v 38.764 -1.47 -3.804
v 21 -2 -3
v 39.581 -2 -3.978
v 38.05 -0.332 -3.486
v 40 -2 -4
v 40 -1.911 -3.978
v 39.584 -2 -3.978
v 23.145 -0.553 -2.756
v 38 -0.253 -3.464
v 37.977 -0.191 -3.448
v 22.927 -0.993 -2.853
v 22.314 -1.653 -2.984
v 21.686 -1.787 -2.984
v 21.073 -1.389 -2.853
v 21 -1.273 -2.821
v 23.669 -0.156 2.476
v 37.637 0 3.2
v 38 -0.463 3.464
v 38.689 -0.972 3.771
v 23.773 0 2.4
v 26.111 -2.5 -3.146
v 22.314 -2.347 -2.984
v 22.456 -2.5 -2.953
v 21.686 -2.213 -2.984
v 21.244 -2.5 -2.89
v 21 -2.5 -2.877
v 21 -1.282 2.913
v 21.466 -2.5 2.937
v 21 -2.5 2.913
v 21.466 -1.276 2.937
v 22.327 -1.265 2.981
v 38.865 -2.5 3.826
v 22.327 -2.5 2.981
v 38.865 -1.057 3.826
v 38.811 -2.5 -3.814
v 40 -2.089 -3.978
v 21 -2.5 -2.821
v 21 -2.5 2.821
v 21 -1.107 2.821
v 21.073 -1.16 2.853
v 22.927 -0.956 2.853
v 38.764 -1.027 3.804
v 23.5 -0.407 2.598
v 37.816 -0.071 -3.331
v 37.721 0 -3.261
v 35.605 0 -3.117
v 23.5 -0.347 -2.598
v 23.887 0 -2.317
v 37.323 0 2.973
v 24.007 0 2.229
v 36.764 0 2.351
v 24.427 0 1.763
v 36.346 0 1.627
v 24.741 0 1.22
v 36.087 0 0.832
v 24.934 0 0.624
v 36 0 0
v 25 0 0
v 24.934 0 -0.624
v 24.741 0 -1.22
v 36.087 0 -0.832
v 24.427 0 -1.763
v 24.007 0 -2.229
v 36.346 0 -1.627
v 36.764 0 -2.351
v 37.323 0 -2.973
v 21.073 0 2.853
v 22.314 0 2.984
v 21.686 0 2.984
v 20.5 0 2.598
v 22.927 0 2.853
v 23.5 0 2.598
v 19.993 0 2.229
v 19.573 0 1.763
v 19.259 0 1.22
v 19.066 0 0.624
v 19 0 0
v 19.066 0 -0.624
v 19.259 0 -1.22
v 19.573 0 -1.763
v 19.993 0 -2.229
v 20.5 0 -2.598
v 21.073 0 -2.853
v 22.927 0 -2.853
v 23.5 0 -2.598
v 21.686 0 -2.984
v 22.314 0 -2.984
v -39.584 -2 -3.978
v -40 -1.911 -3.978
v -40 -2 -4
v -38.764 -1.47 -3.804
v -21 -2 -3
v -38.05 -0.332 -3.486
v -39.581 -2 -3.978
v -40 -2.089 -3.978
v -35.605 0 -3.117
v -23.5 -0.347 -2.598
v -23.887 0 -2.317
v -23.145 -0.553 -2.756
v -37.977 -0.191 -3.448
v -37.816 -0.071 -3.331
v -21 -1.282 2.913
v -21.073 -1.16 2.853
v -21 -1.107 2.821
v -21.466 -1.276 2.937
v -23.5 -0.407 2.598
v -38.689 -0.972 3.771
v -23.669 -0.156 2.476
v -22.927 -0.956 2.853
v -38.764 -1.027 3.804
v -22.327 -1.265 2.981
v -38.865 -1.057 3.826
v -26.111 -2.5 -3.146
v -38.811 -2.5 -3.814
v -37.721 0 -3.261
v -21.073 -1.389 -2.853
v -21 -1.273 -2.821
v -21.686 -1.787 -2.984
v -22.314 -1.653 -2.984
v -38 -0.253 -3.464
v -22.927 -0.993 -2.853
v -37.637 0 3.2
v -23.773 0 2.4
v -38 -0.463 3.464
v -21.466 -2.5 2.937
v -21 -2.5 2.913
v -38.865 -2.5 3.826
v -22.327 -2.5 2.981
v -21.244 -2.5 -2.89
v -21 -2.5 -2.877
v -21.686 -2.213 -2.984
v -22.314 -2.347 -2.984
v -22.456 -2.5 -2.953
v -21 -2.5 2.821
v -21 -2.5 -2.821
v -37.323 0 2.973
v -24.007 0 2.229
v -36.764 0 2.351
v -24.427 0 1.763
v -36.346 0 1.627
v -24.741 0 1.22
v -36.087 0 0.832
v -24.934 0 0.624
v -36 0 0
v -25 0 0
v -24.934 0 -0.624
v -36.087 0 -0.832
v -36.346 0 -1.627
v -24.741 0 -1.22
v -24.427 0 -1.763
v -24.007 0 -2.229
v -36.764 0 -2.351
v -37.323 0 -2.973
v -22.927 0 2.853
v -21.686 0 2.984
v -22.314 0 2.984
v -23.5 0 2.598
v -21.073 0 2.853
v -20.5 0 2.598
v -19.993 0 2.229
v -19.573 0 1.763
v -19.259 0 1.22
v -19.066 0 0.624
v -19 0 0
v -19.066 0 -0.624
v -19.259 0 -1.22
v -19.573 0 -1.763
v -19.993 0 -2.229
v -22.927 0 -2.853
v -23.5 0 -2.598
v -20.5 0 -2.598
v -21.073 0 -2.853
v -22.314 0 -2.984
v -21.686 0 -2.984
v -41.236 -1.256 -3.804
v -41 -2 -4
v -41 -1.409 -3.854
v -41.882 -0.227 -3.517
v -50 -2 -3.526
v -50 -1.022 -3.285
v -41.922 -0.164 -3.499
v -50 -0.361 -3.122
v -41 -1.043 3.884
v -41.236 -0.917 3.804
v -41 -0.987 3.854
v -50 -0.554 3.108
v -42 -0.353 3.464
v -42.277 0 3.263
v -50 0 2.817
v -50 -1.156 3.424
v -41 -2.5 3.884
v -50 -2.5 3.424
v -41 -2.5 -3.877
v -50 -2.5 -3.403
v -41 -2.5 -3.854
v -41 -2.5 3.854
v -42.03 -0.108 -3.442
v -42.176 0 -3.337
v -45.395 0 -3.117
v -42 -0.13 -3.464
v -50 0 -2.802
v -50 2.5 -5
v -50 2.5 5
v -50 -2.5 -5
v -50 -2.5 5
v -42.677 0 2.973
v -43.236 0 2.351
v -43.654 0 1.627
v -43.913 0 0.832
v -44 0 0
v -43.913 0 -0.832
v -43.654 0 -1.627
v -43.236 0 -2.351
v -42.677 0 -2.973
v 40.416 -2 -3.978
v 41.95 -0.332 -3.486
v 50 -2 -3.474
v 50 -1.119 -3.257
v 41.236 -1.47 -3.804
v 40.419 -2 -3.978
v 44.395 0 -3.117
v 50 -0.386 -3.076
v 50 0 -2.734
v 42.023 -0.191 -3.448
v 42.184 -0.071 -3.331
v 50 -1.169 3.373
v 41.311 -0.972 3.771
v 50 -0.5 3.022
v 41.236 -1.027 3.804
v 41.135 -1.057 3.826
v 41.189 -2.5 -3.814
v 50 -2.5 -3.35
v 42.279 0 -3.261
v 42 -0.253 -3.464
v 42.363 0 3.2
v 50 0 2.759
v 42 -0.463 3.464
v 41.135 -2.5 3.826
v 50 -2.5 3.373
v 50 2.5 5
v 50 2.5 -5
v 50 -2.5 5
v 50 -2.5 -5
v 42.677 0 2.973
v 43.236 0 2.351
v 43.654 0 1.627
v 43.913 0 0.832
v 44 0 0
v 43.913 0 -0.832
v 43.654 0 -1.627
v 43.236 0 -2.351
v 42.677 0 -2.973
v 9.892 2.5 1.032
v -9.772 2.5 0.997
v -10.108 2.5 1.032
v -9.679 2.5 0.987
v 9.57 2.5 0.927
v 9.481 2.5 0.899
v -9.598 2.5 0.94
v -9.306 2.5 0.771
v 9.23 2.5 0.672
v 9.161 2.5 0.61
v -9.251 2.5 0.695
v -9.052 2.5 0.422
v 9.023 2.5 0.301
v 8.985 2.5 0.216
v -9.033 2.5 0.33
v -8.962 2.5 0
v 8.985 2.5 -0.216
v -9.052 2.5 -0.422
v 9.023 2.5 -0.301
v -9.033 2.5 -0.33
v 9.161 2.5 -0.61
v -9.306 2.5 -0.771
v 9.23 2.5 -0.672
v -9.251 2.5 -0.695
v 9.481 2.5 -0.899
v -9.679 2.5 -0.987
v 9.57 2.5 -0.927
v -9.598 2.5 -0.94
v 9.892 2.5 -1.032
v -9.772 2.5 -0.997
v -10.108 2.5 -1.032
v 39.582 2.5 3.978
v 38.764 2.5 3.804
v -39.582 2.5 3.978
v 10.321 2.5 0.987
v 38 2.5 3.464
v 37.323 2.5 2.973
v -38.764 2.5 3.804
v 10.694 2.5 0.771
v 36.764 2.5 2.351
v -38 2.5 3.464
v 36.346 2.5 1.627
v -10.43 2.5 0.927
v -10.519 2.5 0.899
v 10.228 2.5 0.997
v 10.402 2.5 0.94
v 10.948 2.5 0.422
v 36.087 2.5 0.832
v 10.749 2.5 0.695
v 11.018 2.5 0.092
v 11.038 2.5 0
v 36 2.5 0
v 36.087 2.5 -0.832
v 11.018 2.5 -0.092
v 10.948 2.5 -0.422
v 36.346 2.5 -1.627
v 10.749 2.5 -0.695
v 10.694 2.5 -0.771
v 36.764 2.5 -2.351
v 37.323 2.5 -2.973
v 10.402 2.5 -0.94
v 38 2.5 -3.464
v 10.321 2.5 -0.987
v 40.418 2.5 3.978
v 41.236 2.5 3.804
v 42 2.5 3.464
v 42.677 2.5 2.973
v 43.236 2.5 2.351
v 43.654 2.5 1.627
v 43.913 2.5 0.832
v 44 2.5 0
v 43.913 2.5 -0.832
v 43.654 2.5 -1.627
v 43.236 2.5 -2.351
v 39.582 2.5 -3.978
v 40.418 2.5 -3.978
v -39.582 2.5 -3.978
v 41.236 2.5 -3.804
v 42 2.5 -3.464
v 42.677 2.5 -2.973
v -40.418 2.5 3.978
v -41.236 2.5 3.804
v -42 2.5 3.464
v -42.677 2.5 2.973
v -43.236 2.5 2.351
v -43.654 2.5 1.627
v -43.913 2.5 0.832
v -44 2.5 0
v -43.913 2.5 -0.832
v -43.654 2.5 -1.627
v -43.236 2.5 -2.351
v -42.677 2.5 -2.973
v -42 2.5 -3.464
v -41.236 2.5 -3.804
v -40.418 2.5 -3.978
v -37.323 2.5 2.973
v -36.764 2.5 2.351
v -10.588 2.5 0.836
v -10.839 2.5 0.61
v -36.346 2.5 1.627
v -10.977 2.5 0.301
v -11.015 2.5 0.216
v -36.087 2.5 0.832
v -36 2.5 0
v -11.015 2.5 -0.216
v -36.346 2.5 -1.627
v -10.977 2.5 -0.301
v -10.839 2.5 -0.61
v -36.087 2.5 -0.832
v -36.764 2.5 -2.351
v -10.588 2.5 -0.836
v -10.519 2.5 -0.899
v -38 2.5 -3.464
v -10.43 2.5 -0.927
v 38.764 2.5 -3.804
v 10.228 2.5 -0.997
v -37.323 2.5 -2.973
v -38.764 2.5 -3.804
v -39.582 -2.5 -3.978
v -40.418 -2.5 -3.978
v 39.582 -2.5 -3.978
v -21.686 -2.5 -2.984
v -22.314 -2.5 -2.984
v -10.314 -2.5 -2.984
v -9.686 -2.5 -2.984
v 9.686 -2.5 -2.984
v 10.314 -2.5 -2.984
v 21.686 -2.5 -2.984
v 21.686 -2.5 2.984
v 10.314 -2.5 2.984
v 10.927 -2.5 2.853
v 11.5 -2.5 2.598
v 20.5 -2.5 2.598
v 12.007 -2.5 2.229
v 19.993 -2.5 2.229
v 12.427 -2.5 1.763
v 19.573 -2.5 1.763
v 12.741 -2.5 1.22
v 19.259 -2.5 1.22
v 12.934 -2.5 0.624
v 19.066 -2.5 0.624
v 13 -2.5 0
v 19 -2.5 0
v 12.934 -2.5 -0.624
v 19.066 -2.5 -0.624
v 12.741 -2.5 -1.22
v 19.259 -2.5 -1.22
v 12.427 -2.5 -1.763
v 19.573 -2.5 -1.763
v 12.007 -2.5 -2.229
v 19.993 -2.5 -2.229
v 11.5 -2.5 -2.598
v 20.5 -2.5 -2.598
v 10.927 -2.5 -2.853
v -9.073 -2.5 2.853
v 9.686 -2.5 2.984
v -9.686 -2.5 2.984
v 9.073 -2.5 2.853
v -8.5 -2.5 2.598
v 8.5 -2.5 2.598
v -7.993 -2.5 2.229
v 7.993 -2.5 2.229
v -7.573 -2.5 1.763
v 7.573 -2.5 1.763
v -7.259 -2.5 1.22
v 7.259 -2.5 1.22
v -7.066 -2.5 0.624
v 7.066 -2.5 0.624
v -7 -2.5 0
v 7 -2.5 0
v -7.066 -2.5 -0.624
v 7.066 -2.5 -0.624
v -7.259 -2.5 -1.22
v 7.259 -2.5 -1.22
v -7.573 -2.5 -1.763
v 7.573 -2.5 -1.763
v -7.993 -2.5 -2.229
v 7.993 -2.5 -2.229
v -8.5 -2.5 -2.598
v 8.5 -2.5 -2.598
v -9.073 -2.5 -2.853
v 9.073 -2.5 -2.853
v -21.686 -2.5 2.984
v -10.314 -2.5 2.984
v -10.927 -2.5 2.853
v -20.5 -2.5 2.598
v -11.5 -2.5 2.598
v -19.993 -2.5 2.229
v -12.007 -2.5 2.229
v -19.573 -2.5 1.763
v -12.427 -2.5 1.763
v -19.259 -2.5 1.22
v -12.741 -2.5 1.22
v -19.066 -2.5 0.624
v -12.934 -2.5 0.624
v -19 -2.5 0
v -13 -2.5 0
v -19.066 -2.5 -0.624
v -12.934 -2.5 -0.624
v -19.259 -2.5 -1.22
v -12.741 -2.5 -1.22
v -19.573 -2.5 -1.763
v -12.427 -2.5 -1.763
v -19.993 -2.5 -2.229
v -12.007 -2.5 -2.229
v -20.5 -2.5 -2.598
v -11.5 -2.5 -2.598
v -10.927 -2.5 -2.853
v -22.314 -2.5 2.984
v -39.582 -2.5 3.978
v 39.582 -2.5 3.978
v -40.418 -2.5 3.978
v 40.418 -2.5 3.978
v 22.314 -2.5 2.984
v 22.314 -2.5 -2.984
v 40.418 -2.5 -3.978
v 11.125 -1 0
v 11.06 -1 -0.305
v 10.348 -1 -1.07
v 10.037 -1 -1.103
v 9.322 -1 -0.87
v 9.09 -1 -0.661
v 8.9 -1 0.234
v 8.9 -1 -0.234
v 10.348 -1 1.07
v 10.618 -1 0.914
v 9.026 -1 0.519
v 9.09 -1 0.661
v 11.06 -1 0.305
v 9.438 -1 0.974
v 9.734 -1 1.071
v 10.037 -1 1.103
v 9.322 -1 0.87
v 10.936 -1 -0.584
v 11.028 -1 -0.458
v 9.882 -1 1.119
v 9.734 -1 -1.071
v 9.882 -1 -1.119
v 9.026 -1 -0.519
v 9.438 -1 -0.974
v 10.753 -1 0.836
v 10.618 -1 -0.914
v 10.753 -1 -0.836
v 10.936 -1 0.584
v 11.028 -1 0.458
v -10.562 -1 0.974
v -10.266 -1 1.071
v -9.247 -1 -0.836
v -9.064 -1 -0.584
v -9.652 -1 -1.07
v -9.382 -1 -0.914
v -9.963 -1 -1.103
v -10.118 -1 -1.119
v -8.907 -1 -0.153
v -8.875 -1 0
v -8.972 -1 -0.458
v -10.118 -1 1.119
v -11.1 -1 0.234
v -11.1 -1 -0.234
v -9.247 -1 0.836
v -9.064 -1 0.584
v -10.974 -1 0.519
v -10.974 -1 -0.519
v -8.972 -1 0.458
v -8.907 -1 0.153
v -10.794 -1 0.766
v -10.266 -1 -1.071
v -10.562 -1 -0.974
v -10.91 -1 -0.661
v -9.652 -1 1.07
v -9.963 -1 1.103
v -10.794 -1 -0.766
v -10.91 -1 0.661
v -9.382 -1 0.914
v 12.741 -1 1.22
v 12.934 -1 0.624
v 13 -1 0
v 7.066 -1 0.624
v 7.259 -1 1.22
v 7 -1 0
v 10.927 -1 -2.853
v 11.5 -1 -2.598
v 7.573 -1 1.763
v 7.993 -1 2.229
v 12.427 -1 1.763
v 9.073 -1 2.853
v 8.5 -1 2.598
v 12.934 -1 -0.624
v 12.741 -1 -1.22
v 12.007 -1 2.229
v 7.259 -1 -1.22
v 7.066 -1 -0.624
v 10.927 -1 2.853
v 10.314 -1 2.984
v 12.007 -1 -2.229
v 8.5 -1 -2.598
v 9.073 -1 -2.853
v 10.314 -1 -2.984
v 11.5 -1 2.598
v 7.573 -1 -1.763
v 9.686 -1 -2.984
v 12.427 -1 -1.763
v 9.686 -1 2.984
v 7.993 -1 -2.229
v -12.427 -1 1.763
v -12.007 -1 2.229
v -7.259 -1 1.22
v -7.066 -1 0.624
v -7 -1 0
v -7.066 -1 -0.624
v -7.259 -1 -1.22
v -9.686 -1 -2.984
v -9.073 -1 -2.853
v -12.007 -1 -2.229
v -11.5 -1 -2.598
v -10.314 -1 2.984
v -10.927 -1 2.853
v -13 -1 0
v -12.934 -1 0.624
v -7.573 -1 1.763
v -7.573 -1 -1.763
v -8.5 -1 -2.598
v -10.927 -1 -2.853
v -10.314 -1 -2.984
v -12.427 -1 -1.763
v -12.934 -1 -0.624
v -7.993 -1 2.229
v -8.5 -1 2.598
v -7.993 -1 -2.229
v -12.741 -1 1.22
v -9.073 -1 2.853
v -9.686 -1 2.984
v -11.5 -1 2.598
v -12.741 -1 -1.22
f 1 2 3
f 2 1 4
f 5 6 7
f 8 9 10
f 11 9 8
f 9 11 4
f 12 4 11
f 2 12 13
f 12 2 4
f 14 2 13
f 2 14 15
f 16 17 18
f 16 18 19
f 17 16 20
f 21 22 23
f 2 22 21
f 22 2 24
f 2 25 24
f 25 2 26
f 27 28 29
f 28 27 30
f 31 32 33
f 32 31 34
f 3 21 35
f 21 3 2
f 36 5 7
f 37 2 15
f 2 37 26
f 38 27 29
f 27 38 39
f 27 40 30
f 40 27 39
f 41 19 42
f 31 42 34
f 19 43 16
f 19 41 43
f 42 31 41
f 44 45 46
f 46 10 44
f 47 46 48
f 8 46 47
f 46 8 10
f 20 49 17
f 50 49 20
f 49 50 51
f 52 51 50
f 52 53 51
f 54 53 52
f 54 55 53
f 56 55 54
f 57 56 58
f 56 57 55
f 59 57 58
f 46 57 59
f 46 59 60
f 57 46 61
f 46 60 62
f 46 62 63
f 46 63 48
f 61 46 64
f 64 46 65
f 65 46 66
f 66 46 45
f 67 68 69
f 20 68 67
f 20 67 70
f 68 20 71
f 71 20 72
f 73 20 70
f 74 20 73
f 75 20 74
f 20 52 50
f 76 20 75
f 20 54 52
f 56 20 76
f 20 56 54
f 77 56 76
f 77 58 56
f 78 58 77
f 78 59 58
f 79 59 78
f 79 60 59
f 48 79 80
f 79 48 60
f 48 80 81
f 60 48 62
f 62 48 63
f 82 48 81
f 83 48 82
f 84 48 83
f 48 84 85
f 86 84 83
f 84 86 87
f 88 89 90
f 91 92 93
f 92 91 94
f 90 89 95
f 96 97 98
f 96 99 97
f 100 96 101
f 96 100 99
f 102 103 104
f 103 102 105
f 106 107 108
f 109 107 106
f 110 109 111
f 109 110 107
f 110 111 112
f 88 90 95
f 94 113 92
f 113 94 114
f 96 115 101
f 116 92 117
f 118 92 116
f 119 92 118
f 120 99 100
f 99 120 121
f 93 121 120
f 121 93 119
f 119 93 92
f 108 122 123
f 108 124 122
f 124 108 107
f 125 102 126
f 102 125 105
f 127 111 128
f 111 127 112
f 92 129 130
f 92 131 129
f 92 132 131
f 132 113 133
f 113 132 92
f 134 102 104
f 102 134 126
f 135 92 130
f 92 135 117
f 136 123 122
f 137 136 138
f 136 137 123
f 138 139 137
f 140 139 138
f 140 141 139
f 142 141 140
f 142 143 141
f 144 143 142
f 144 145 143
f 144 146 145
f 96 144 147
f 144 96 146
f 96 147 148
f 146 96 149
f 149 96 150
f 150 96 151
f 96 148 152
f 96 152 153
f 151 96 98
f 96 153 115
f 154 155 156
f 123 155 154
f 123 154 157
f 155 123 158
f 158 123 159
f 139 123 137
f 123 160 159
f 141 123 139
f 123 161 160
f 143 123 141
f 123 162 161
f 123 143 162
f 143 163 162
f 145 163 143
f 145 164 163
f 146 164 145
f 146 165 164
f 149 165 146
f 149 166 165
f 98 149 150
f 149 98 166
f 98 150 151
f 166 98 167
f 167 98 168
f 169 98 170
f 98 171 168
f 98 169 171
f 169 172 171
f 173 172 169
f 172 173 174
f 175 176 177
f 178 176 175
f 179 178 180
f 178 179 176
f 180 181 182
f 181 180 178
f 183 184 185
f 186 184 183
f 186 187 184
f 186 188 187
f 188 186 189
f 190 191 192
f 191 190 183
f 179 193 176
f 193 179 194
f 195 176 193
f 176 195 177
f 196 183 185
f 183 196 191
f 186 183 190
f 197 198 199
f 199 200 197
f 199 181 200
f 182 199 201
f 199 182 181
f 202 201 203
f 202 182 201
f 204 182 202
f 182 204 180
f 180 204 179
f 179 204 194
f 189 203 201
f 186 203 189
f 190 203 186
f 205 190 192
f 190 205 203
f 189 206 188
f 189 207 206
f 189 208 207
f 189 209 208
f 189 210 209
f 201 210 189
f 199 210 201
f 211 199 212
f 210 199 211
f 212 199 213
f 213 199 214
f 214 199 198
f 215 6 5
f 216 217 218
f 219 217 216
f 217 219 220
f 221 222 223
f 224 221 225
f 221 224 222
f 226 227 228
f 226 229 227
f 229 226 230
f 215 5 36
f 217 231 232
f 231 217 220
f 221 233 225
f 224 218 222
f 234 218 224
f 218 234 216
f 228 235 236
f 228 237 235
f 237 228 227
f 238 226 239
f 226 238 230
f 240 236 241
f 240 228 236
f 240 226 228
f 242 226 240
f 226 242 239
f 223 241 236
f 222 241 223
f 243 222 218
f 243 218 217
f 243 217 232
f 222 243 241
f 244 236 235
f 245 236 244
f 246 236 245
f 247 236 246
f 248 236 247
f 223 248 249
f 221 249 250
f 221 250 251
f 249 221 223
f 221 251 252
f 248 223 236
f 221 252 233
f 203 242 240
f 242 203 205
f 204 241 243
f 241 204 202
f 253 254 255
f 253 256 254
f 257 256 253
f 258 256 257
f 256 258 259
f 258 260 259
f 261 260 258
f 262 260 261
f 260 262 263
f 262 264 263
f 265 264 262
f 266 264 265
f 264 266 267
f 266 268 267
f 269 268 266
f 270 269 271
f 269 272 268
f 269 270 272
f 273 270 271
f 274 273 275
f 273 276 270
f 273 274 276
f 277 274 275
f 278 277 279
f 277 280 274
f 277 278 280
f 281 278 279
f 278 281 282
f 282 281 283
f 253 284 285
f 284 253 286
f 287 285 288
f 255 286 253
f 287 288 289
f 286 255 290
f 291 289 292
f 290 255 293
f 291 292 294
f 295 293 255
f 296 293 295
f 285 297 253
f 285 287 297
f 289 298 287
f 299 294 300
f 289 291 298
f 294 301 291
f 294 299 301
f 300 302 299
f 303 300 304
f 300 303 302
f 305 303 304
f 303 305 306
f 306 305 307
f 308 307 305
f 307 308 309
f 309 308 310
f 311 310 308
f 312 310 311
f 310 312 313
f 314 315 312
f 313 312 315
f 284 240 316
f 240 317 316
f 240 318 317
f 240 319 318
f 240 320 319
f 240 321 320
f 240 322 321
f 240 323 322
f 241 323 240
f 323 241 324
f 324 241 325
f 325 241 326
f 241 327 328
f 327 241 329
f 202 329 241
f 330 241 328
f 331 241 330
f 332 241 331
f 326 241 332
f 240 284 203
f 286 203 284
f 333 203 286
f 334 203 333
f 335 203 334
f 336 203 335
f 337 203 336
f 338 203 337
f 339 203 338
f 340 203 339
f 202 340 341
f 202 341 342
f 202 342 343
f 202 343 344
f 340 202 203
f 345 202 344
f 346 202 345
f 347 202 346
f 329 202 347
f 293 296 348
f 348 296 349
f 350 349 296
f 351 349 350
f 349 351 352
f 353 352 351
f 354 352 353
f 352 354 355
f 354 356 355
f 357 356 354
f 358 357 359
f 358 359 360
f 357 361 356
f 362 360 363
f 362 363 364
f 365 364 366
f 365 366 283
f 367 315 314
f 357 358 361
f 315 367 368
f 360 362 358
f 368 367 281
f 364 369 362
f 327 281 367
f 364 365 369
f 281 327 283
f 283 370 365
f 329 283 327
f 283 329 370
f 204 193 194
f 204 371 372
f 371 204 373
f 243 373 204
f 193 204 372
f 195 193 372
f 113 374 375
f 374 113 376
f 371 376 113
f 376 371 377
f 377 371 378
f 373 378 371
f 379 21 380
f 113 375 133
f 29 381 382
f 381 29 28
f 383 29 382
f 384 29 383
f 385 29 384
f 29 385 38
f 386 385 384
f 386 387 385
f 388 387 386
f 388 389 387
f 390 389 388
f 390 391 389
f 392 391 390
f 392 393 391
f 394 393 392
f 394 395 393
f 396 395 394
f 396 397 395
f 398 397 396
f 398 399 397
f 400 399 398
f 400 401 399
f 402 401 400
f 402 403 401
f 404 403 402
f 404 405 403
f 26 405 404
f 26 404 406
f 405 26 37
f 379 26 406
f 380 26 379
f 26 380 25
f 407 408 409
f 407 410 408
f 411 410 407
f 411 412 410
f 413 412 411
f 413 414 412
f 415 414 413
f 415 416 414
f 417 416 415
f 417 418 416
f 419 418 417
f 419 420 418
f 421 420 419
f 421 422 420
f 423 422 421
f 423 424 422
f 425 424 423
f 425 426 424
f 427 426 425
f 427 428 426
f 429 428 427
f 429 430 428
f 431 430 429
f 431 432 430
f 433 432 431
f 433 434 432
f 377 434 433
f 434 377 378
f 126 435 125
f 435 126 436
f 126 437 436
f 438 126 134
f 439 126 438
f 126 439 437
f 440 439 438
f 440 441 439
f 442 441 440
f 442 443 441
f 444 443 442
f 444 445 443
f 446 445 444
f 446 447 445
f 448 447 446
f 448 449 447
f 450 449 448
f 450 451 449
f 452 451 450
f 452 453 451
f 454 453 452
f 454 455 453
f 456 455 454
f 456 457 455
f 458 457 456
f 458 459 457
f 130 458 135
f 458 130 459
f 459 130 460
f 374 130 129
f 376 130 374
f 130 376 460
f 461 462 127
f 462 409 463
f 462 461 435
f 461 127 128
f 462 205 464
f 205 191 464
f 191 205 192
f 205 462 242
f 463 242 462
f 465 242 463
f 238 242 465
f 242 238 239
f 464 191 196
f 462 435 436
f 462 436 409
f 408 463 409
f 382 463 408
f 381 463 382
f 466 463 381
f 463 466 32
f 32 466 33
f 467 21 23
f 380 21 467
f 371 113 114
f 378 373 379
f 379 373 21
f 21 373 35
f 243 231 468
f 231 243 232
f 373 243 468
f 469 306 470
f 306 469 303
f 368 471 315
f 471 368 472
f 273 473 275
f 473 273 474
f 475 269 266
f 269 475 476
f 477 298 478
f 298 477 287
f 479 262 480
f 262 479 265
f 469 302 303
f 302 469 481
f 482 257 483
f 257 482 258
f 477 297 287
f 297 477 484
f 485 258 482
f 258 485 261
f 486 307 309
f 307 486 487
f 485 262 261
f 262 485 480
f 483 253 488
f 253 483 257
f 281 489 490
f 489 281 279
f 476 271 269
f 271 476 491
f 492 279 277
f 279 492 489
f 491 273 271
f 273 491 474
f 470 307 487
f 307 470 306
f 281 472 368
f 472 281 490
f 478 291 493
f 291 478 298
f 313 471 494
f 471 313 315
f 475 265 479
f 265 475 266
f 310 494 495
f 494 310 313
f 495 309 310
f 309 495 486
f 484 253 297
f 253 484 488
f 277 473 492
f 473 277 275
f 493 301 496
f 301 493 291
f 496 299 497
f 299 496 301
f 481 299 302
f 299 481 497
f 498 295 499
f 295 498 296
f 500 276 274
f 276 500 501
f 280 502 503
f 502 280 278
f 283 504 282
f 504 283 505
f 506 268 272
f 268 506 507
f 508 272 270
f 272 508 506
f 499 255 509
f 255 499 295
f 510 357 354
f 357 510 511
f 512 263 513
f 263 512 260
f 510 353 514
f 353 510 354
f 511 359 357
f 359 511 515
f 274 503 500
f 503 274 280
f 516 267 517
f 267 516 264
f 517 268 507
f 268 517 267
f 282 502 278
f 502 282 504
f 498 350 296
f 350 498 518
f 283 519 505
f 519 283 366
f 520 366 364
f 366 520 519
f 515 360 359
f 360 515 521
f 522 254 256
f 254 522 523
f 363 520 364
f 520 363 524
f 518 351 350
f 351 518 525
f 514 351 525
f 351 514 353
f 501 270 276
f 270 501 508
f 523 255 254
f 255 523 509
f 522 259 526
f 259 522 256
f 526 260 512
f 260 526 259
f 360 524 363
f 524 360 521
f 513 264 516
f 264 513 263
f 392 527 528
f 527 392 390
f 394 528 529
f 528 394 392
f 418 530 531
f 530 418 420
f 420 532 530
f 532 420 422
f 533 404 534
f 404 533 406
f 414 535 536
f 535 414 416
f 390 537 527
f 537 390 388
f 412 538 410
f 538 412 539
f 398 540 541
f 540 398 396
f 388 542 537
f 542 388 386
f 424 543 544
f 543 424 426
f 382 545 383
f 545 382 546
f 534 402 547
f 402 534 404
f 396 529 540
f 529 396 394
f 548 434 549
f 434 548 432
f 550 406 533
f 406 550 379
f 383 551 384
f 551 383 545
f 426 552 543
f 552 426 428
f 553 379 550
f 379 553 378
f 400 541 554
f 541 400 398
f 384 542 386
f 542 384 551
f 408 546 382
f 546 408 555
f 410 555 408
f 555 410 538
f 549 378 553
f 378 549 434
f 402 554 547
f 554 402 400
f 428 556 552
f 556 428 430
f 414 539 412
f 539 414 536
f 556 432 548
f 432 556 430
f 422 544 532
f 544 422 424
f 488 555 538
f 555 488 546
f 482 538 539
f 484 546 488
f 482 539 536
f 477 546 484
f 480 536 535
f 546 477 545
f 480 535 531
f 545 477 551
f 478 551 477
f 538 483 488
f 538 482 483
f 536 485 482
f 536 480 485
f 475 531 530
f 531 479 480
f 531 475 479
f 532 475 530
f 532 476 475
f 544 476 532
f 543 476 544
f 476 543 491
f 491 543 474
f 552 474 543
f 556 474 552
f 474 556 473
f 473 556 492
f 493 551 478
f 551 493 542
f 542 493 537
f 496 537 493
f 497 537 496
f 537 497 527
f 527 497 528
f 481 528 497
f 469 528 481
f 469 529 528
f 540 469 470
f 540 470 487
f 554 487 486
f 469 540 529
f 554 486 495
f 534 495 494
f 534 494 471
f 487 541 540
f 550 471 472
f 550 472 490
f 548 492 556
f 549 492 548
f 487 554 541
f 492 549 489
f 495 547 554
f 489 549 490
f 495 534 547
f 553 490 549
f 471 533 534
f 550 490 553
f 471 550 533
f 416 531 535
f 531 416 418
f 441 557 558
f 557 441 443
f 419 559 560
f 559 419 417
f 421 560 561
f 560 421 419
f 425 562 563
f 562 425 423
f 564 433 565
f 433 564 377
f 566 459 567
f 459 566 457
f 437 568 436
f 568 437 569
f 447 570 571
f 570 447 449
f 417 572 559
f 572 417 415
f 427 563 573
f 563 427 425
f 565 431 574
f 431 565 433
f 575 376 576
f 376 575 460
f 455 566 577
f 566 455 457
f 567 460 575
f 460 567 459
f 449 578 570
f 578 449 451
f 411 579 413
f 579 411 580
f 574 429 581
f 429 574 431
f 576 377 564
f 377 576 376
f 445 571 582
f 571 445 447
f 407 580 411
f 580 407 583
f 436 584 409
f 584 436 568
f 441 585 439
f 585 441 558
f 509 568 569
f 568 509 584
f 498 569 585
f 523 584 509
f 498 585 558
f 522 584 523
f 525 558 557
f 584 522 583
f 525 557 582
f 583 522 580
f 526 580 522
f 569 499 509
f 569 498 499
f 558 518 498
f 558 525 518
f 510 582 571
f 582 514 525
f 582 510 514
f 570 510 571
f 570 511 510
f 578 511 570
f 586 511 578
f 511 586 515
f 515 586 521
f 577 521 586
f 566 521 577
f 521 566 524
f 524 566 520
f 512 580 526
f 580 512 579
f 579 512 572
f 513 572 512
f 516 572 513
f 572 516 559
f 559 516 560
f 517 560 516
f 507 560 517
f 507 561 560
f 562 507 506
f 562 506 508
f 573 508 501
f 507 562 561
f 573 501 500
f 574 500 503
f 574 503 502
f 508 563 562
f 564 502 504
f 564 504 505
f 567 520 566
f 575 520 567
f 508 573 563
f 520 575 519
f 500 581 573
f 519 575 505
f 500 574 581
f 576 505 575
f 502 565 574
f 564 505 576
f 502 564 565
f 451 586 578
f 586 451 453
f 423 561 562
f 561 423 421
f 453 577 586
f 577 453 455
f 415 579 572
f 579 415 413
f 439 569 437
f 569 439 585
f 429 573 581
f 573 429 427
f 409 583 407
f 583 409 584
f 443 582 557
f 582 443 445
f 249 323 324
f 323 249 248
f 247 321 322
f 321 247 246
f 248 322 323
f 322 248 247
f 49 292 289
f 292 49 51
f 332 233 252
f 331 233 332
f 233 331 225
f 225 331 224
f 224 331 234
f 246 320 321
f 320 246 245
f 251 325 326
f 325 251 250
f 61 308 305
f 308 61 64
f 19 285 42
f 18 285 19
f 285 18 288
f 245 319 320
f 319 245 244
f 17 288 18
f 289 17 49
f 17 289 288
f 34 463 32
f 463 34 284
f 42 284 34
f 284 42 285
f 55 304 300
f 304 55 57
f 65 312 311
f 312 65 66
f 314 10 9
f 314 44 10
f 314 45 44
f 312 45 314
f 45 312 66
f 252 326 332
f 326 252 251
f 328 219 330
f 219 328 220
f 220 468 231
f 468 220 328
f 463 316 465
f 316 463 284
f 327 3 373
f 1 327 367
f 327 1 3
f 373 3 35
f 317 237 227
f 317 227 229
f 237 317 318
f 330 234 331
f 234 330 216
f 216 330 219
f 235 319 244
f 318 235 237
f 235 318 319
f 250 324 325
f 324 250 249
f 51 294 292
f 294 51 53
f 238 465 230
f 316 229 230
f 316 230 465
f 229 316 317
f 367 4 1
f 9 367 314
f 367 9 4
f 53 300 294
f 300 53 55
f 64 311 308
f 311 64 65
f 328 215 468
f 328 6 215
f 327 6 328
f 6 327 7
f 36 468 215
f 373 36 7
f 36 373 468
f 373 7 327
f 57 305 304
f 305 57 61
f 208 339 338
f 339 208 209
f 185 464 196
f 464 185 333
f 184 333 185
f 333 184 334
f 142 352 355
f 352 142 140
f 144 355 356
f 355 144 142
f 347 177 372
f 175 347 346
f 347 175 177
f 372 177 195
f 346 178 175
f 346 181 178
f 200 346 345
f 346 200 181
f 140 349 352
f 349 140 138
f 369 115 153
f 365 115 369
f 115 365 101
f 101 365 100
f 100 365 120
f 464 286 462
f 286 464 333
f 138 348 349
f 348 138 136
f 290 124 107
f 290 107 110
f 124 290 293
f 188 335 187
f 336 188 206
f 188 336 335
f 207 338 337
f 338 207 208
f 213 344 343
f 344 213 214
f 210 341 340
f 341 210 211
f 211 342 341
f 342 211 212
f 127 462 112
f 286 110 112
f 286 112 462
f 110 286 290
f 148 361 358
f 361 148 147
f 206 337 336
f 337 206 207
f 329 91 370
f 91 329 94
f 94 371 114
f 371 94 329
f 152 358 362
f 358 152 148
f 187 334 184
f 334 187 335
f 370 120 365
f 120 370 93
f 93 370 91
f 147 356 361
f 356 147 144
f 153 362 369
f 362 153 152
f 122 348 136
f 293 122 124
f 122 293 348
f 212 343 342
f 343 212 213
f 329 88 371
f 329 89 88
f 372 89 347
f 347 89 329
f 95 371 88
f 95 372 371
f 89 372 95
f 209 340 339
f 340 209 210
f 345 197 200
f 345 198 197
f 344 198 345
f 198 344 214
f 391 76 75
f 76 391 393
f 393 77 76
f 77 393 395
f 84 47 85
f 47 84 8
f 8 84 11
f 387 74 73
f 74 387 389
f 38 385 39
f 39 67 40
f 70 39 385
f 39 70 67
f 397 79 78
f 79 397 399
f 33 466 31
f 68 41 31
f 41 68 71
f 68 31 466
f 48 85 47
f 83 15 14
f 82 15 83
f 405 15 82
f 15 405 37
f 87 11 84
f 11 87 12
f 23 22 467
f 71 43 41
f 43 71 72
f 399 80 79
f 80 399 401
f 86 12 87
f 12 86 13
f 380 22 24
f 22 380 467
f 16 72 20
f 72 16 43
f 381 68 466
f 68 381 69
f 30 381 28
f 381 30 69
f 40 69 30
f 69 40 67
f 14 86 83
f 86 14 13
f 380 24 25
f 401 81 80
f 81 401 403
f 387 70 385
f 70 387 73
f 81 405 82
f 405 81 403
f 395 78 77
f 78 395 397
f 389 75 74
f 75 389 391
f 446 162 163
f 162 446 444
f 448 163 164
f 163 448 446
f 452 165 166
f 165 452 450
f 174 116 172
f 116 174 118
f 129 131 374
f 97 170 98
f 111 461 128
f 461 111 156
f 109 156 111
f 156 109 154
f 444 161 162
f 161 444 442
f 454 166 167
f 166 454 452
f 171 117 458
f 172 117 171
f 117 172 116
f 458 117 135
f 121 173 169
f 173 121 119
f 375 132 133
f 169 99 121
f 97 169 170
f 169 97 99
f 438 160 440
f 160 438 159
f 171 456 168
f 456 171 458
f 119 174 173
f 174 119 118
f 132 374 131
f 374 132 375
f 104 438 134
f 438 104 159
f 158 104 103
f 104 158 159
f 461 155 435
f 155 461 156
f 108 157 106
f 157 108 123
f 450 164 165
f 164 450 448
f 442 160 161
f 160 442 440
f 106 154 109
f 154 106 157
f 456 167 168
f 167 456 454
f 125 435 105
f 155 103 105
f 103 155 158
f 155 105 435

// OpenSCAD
difference() {
    // levy
    cube([100,5,10],center=true);
    
    // ruuviaukot
    rotate([-90,0,0])translate([10,0,-4])cylinder(8,1.2,1,$fn=15);
    rotate([-90,0,0])translate([-10,0,-4])cylinder(8,1.2,1,$fn=15);
    rotate([90,0,0])translate([10,0,1]) cylinder(h=10,r1=3,r2=3,$fn=30);
    rotate([90,0,0])translate([-10,0,1]) cylinder(h=10,r1=3,r2=3,$fn=30);
    
    // kiinnitysreiät
    rotate([90,0,0]) translate([40,0,-5]) cylinder(h=10,d=8,$fn=30);
    rotate([90,0,0]) translate([-40,0,-5]) cylinder(h=10,d=8,$fn=30);  
    
        // servon kiinnitysreäit
    difference() {
        rotate([0,90,0])translate([0,-2,21]) cylinder(h=19,r1=3,r2=4);
        translate([20,0,-5]) cube([20,5,10]);
    }
    rotate([90,0,0])translate([22,0,0]) cylinder(h=10,r1=3,r2=3,$fn=30);
    
    difference() {
        rotate([0,90,0])translate([0,-2,-40]) cylinder(h=19,r1=4,r2=3);
        translate([-40,0,-5]) cube([20,5,10]);
    }
    rotate([90,0,0])translate([-22,0,0]) cylinder(h=10,r1=3,r2=3,$fn=30);
    difference() {
            rotate([0,90,0])translate([0,-2,-60]) cylinder(h=19,r1=3,r2=4);
            translate([-50,0,-5]) cube([20,5,10]);
    }
    
    difference() {
            rotate([0,90,0])translate([0,-2,40]) cylinder(h=19,r1=4,r2=3);
            translate([30,0,-5]) cube([20,5,10]);
    }

}
